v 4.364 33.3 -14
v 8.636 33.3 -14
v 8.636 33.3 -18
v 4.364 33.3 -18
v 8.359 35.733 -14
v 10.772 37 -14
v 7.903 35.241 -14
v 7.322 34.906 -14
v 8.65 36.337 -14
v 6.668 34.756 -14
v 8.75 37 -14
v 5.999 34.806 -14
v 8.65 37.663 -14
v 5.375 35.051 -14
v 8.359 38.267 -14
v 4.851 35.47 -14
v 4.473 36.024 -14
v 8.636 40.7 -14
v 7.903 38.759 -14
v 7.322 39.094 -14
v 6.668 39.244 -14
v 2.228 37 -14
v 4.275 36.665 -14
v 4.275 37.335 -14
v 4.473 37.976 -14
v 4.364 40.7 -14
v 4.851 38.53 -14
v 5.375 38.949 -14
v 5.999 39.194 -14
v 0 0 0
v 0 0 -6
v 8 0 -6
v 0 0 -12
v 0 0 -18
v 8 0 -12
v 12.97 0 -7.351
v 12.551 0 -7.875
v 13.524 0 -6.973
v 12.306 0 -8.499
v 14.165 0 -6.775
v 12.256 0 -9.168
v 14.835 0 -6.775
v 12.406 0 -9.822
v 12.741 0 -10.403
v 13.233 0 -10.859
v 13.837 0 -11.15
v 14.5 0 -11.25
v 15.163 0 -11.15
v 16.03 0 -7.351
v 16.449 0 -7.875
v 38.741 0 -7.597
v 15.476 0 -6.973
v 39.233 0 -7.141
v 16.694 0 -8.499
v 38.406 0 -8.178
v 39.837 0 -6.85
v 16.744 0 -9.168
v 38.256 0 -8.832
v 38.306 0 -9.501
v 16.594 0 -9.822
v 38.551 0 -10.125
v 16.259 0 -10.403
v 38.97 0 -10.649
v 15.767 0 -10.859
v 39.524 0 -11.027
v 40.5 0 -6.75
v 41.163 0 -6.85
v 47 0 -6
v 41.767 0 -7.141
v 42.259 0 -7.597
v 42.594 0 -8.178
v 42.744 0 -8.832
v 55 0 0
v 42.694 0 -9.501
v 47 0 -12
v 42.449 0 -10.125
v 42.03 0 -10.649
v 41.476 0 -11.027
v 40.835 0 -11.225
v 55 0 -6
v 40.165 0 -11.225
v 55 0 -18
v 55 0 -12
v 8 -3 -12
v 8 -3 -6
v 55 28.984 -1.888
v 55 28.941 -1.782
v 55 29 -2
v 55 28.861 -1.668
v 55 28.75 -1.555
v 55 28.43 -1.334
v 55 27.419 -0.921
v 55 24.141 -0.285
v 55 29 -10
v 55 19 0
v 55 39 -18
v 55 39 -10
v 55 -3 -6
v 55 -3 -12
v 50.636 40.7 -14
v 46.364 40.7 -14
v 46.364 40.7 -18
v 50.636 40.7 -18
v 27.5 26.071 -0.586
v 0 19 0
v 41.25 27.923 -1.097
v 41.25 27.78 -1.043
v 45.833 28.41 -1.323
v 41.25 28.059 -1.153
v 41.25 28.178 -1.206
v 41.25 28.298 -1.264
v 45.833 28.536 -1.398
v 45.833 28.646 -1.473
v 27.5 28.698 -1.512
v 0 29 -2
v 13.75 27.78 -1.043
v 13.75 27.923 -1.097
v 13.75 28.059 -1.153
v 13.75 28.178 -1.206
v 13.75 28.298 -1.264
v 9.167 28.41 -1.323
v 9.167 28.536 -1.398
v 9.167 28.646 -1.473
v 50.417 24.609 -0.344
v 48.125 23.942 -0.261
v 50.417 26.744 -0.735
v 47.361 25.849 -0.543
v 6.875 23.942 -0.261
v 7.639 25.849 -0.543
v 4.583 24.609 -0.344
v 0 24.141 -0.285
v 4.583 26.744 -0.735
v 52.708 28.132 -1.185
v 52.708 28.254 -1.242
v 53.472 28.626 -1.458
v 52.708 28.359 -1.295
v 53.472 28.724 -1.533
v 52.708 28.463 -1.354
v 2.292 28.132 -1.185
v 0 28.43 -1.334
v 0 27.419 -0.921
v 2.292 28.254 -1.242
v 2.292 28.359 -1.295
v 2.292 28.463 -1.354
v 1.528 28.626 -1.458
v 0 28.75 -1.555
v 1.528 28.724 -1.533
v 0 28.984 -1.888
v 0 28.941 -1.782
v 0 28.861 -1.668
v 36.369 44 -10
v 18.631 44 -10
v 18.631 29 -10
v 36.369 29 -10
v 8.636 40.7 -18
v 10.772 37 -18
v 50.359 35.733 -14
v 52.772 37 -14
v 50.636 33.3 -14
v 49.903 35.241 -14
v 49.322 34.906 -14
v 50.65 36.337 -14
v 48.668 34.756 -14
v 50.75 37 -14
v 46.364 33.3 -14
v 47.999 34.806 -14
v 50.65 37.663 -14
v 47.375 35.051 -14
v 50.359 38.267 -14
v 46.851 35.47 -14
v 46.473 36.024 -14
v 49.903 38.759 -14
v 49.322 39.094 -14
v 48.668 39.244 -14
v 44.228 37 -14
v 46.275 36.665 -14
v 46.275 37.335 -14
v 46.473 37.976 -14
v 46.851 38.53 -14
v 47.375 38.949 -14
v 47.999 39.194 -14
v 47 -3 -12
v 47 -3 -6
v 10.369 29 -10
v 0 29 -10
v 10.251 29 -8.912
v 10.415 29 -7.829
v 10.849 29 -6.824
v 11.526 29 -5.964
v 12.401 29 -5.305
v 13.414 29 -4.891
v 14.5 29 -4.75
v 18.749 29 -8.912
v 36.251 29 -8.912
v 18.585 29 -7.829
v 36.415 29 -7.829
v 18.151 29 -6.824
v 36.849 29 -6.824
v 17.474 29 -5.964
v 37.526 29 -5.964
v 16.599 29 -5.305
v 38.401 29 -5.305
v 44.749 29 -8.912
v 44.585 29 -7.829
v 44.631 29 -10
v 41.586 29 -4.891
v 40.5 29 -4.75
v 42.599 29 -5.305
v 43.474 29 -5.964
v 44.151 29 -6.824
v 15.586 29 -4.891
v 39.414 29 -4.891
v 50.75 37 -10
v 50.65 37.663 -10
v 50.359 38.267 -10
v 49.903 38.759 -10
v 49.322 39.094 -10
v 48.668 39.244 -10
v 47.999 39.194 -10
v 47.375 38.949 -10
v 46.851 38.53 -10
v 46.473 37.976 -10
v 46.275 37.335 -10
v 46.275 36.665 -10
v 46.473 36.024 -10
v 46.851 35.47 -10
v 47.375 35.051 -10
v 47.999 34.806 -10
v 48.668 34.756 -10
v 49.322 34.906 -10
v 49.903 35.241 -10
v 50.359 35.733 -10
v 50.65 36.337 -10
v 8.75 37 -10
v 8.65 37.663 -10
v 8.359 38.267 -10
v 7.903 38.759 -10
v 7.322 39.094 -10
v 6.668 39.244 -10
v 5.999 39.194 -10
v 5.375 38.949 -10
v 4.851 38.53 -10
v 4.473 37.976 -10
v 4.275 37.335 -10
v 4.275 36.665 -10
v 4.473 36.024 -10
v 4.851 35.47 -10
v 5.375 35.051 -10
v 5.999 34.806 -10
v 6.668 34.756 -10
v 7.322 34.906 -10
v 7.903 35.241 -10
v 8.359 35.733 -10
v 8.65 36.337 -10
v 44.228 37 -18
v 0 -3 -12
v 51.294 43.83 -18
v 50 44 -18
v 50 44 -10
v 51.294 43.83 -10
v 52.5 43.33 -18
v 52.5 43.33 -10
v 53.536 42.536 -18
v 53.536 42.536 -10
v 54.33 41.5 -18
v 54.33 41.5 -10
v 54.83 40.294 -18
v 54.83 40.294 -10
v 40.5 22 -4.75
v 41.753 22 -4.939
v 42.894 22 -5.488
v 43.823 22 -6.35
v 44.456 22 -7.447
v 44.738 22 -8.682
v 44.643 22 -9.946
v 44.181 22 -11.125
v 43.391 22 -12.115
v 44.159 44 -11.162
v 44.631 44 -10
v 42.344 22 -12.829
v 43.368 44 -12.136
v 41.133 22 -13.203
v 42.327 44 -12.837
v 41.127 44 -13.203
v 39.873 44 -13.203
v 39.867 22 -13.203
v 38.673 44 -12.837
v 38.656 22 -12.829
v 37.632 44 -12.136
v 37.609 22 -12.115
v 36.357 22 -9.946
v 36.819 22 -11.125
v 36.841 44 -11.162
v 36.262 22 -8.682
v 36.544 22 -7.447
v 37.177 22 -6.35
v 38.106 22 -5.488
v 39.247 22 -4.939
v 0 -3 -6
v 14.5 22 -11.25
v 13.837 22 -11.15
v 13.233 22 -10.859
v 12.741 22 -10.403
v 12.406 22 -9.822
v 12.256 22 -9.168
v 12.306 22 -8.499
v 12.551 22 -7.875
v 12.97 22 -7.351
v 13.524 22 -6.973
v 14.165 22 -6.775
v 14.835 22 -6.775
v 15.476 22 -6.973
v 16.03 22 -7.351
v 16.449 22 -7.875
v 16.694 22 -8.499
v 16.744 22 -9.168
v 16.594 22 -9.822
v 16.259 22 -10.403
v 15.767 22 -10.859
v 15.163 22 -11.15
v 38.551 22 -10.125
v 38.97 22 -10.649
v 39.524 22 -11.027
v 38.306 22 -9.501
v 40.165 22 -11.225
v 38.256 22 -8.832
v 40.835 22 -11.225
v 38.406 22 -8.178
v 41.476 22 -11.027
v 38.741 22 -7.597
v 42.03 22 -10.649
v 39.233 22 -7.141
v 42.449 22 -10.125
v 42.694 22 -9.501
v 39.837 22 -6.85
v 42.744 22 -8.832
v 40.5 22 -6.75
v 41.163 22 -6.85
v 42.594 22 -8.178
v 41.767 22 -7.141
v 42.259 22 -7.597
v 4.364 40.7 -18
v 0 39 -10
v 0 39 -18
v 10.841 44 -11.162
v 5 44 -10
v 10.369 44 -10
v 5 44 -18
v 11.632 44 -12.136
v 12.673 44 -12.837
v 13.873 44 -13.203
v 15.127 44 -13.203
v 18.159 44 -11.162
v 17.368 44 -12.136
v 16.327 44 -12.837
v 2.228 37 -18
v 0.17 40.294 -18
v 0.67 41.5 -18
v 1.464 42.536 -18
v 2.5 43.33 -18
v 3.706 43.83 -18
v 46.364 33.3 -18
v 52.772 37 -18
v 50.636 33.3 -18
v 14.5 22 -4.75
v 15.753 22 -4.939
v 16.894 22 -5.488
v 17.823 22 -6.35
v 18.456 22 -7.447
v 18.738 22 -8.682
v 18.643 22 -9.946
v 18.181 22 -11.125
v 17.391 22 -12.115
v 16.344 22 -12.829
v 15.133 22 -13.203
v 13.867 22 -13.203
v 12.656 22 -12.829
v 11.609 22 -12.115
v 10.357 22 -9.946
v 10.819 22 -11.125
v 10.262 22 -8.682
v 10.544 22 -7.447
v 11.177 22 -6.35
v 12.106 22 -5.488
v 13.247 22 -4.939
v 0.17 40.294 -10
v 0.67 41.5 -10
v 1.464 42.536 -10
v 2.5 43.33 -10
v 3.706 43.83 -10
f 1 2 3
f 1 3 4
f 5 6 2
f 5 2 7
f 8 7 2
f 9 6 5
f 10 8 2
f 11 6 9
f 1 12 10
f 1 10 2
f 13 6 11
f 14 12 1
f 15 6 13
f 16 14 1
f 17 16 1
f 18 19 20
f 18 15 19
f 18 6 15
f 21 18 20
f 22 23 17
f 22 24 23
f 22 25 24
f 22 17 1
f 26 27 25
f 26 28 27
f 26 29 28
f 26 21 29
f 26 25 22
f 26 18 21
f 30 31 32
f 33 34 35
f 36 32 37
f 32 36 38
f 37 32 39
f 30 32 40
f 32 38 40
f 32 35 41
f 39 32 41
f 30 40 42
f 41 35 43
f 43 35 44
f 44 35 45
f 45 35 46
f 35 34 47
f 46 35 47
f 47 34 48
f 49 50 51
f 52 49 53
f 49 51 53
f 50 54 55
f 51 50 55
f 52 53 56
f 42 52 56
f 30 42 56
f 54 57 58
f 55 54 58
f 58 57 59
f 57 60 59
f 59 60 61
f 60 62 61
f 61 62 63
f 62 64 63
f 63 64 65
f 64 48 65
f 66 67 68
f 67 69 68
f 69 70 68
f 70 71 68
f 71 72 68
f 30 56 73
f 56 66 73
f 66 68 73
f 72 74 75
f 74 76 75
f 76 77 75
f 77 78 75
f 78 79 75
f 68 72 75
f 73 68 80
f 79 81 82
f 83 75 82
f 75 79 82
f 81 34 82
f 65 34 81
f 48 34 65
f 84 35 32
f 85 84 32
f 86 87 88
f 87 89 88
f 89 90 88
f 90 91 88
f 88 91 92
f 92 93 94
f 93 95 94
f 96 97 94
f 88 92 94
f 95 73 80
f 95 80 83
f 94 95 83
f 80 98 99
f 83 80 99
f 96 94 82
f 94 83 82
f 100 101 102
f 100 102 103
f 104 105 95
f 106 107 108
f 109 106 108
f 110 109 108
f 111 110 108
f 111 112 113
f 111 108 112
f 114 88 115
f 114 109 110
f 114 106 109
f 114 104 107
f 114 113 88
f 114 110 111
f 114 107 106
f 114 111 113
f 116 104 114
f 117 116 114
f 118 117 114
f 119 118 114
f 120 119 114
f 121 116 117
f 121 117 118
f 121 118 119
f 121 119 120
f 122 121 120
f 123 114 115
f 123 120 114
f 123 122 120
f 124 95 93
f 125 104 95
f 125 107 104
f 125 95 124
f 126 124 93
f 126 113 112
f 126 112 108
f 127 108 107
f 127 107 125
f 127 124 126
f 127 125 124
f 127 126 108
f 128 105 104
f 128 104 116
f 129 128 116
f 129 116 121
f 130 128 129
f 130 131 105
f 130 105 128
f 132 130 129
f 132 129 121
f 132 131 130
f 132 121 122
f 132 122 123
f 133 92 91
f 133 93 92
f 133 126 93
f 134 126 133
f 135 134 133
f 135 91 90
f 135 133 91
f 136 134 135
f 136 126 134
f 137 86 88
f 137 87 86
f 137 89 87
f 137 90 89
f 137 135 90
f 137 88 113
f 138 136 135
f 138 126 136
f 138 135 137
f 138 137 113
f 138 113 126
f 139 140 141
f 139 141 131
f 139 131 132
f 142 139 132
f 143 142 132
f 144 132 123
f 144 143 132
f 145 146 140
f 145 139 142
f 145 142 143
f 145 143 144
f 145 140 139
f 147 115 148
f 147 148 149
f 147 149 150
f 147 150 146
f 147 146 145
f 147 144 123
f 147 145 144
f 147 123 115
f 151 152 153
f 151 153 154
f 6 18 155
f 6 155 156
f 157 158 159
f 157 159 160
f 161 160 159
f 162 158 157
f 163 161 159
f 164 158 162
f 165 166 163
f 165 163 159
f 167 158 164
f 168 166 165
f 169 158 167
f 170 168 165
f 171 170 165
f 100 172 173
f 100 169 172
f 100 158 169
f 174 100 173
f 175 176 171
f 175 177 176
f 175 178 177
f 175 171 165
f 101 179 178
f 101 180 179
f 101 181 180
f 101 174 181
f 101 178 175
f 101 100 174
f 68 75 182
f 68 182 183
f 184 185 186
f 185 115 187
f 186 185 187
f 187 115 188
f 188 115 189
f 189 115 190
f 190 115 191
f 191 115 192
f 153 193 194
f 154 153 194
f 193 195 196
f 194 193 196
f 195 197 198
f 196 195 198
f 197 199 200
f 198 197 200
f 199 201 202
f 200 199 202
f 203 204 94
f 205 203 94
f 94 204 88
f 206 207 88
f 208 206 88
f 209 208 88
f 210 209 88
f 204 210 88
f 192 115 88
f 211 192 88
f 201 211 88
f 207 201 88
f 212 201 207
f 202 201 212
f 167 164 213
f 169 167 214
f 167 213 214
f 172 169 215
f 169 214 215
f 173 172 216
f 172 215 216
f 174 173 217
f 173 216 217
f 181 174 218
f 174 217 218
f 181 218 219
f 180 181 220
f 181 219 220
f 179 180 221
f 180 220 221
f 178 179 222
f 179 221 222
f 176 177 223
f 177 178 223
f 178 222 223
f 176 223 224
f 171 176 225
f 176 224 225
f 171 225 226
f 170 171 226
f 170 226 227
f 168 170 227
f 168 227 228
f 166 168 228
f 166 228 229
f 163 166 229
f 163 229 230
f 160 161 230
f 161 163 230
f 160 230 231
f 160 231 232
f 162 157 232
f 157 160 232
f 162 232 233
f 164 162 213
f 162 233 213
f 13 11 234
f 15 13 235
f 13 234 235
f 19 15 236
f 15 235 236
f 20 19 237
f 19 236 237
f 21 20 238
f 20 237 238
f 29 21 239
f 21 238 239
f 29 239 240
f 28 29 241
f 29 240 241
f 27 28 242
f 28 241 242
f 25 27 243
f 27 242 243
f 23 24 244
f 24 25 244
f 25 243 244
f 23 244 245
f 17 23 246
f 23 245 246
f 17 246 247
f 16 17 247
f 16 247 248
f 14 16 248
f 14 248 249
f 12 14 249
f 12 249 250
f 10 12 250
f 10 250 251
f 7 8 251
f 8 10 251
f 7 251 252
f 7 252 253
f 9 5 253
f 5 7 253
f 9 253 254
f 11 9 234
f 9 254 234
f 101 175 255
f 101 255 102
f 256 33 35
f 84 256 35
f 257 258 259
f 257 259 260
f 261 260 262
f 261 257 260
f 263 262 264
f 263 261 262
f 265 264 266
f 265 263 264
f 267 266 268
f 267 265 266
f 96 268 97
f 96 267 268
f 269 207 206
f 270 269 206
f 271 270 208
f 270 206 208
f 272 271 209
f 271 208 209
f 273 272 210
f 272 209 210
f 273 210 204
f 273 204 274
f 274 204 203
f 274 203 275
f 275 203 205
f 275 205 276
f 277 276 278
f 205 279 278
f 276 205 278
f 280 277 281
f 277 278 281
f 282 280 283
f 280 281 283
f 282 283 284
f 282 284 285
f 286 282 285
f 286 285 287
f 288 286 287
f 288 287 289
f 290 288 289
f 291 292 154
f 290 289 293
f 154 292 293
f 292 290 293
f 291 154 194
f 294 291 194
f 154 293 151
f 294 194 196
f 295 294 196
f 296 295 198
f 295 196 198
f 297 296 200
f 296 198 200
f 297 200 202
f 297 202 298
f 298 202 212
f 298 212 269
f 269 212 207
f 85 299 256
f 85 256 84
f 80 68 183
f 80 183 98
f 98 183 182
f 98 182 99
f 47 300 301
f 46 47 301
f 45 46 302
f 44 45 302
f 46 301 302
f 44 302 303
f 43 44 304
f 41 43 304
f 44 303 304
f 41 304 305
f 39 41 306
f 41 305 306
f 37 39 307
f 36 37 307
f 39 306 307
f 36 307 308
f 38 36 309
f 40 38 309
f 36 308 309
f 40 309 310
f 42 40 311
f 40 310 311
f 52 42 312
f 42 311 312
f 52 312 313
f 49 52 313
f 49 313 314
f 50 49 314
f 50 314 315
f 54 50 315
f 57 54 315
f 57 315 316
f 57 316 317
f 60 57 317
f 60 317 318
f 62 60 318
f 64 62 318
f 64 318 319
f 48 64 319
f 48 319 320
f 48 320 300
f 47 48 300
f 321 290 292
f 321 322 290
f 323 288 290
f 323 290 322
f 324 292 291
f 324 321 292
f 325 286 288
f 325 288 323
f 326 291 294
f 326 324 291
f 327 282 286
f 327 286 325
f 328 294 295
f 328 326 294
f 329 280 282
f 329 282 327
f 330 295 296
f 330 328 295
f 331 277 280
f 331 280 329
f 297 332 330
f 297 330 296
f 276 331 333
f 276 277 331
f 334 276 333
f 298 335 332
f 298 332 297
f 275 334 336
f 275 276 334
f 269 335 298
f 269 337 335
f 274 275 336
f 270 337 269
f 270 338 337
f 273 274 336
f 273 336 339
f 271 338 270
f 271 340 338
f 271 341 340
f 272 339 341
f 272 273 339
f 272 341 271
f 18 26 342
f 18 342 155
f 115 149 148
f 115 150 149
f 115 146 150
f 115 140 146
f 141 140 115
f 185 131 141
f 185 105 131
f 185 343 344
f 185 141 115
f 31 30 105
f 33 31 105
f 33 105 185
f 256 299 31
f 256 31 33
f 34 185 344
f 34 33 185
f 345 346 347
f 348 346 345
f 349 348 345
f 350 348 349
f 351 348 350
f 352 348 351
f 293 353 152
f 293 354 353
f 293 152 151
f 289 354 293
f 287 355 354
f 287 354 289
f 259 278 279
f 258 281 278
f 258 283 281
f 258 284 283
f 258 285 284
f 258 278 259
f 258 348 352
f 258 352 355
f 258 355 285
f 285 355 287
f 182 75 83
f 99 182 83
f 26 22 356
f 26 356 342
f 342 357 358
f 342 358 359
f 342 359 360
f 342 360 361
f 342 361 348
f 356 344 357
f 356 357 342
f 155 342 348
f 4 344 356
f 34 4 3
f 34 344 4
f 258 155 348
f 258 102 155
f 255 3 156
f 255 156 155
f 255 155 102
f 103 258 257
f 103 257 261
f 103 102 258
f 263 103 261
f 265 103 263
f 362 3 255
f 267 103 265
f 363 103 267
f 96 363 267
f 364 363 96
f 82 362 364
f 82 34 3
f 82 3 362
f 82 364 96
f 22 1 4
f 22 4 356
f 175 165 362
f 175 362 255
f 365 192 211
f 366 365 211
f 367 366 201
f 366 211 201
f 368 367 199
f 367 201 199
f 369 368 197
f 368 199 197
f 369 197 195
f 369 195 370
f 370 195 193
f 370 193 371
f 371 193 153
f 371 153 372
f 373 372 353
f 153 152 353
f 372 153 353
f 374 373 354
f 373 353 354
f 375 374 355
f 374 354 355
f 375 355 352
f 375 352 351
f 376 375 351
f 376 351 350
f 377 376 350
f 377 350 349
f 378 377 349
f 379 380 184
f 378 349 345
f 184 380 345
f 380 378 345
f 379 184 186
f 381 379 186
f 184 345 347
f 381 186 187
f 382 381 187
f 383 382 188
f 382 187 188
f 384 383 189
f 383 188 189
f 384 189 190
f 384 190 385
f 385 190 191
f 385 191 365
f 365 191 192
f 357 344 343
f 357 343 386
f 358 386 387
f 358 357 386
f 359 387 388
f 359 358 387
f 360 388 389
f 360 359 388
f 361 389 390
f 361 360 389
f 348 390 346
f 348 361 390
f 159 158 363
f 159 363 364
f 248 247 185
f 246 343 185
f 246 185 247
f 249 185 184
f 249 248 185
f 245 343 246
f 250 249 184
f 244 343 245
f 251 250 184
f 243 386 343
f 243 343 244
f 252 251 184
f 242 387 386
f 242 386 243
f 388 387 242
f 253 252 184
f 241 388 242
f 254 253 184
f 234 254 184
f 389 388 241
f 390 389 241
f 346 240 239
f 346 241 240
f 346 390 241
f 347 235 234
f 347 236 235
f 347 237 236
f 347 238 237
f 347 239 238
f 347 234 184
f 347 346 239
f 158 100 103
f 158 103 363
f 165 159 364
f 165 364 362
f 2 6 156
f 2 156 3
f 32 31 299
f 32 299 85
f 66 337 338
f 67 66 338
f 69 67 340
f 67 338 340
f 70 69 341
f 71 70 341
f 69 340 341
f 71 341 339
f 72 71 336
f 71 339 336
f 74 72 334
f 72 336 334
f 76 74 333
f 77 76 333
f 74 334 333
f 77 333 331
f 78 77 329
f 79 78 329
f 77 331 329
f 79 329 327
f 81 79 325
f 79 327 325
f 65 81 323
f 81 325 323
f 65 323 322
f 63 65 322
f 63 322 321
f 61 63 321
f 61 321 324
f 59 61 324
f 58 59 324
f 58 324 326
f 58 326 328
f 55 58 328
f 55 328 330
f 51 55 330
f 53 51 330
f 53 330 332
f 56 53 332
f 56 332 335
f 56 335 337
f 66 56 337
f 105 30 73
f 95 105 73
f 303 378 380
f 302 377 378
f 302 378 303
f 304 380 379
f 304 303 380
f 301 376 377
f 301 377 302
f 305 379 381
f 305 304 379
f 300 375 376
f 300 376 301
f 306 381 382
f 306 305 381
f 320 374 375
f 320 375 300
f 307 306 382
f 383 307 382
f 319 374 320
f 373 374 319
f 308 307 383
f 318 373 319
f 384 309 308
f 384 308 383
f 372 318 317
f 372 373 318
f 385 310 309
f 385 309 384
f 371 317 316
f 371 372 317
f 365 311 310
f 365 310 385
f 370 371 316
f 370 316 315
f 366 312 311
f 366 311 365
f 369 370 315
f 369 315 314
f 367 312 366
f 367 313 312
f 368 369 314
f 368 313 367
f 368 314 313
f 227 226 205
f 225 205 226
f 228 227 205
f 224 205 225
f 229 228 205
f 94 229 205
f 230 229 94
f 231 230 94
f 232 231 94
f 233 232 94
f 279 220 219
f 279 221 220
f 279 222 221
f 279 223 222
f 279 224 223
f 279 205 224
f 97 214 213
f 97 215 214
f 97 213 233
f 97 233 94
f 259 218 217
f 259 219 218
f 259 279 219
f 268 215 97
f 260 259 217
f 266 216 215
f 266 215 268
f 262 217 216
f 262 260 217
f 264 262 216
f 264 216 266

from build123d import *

# Parameters (mm, degrees)
SKETCH_1_W          = 55
SKETCH_1_H          = 18
EXTRUDE_1_DEPTH     = 44
SKETCH_2_R          = 2.25
CUT_EXTRUDE_1_DEPTH = 40
SKETCH_3_R          = 2.25
CUT_EXTRUDE_2_DEPTH = 50
SKETCH_4_R          = 4.25
CUT_EXTRUDE_3_DEPTH = 22
CUT_EXTRUDE_START   = -4
SKETCH_5_R          = 2.25
CUT_EXTRUDE_4_DEPTH = 4
FILLET_1_R          = 5
SKETCH_6_W          = 8
SKETCH_6_H          = 6
EXTRUDE_2_DEPTH     = 3
SKETCH_7_W          = 71.435921238
SKETCH_7_H          = 28.786378212
CUT_EXTRUDE_5_DEPTH = 10
FILLET_2_SIZE       = 10
FILLET_2_SIZE_2     = 2


with BuildPart() as part:
    # Эскиз1 → Бобышка-Вытянуть1 (new body)
    with BuildSketch(Plane(origin=(0, 0, 0), x_dir=(1, 0, 0), z_dir=(0, 1, 0))):
        with Locations((27.5, 9)):
            Rectangle(SKETCH_1_W, SKETCH_1_H)
    extrude(amount=EXTRUDE_1_DEPTH)

    # Эскиз2 → Вырез-Вытянуть1 (cut)
    with BuildSketch(Plane.XY):
        with Locations((48.5, 37)):
            Circle(SKETCH_2_R)
        with Locations((6.5, 37)):
            Circle(SKETCH_2_R)
    extrude(amount=-CUT_EXTRUDE_1_DEPTH, mode=Mode.SUBTRACT)

    # Эскиз3 → Вырез-Вытянуть2 (cut)
    with BuildSketch(Plane(origin=(0, 44, 0), x_dir=(1, 0, 0), z_dir=(0, 1, 0))):
        with Locations(Location((40.5, 9, 0), (0, 0, 270))):
            Circle(SKETCH_3_R)
        with Locations(Location((14.5, 9, 0), (0, 0, 90))):
            Circle(SKETCH_3_R)
    extrude(amount=-CUT_EXTRUDE_2_DEPTH, mode=Mode.SUBTRACT)

    # Эскиз4 → Вырез-Вытянуть3 (cut)
    with BuildSketch(Plane(origin=(0, 44, 0), x_dir=(1, 0, 0), z_dir=(0, 1, 0))):
        with Locations(Location((40.5, 9, 0), (0, 0, 270))):
            Circle(SKETCH_4_R)
        with Locations(Location((14.5, 9, 0), (0, 0, 270))):
            Circle(SKETCH_4_R)
    extrude(amount=-CUT_EXTRUDE_3_DEPTH, mode=Mode.SUBTRACT)

    # Эскиз5 → Вырез-Вытянуть4 (cut)
    # profile 1 of 2: a face of its own
    with BuildSketch(Plane(origin=(0, 0, -18), x_dir=(-1, 0, 0), z_dir=(0, 0, -1)).offset(CUT_EXTRUDE_START)):
        Polygon((-52.772391992, 37), (-50.636195996, 33.3), (-46.363804004, 33.3), (-44.227608008, 37), (-46.363804004, 40.7), (-50.636195996, 40.7), align=None)
        with Locations((-48.5, 37)):
            Circle(SKETCH_5_R, mode=Mode.SUBTRACT)
    # profile 2 of 2: a face of its own
    with BuildSketch(Plane(origin=(0, 0, -18), x_dir=(-1, 0, 0), z_dir=(0, 0, -1)).offset(CUT_EXTRUDE_START)):
        Polygon((-10.772391992, 37), (-8.636195996, 33.3), (-4.363804004, 33.3), (-2.227608008, 37), (-4.363804004, 40.7), (-8.636195996, 40.7), align=None)
        with Locations(Location((-6.5, 37, 0), (0, 0, 180))):
            Circle(SKETCH_5_R, mode=Mode.SUBTRACT)
    extrude(amount=CUT_EXTRUDE_4_DEPTH, mode=Mode.SUBTRACT)

    # Скругление1
    fillet_1_edges = [part.edges().sort_by_distance(p)[0] for p in [
        (55, 44, -9),
        (0, 44, -9),
    ]]
    fillet(fillet_1_edges, radius=FILLET_1_R)

    # Эскиз6 → Бобышка-Вытянуть2 (add)
    with BuildSketch(Plane.XZ):
        with Locations((51, -9)):
            Rectangle(SKETCH_6_W, SKETCH_6_H)
        with Locations((4, -9)):
            Rectangle(SKETCH_6_W, SKETCH_6_H)
    extrude(amount=EXTRUDE_2_DEPTH)

    # Эскиз7 → Вырез-Вытянуть5 (cut)
    with BuildSketch(Plane.XY):
        with Locations((35.717960619, 43.393189106)):
            Rectangle(SKETCH_7_W, SKETCH_7_H)
    extrude(amount=-CUT_EXTRUDE_5_DEPTH, mode=Mode.SUBTRACT)

    # Скругление2
    # an asymmetric fillet: 10, 2 mm, written as the material it takes off along each edge
    with BuildSketch(Plane(origin=(-25, 29, 0), x_dir=(0, -1, 0), z_dir=(1, 0, 0))) as fillet_2_piece_1:
        with BuildLine():
            Bezier((FILLET_2_SIZE, 0), (0, 0), (0, FILLET_2_SIZE_2), weights=[1, 0.707106781, 1])
            Line((0, FILLET_2_SIZE_2), (0, 0))
            Line((0, 0), (FILLET_2_SIZE, 0))
        make_face()
    extrude(amount=105, mode=Mode.SUBTRACT)


solid = part.part
